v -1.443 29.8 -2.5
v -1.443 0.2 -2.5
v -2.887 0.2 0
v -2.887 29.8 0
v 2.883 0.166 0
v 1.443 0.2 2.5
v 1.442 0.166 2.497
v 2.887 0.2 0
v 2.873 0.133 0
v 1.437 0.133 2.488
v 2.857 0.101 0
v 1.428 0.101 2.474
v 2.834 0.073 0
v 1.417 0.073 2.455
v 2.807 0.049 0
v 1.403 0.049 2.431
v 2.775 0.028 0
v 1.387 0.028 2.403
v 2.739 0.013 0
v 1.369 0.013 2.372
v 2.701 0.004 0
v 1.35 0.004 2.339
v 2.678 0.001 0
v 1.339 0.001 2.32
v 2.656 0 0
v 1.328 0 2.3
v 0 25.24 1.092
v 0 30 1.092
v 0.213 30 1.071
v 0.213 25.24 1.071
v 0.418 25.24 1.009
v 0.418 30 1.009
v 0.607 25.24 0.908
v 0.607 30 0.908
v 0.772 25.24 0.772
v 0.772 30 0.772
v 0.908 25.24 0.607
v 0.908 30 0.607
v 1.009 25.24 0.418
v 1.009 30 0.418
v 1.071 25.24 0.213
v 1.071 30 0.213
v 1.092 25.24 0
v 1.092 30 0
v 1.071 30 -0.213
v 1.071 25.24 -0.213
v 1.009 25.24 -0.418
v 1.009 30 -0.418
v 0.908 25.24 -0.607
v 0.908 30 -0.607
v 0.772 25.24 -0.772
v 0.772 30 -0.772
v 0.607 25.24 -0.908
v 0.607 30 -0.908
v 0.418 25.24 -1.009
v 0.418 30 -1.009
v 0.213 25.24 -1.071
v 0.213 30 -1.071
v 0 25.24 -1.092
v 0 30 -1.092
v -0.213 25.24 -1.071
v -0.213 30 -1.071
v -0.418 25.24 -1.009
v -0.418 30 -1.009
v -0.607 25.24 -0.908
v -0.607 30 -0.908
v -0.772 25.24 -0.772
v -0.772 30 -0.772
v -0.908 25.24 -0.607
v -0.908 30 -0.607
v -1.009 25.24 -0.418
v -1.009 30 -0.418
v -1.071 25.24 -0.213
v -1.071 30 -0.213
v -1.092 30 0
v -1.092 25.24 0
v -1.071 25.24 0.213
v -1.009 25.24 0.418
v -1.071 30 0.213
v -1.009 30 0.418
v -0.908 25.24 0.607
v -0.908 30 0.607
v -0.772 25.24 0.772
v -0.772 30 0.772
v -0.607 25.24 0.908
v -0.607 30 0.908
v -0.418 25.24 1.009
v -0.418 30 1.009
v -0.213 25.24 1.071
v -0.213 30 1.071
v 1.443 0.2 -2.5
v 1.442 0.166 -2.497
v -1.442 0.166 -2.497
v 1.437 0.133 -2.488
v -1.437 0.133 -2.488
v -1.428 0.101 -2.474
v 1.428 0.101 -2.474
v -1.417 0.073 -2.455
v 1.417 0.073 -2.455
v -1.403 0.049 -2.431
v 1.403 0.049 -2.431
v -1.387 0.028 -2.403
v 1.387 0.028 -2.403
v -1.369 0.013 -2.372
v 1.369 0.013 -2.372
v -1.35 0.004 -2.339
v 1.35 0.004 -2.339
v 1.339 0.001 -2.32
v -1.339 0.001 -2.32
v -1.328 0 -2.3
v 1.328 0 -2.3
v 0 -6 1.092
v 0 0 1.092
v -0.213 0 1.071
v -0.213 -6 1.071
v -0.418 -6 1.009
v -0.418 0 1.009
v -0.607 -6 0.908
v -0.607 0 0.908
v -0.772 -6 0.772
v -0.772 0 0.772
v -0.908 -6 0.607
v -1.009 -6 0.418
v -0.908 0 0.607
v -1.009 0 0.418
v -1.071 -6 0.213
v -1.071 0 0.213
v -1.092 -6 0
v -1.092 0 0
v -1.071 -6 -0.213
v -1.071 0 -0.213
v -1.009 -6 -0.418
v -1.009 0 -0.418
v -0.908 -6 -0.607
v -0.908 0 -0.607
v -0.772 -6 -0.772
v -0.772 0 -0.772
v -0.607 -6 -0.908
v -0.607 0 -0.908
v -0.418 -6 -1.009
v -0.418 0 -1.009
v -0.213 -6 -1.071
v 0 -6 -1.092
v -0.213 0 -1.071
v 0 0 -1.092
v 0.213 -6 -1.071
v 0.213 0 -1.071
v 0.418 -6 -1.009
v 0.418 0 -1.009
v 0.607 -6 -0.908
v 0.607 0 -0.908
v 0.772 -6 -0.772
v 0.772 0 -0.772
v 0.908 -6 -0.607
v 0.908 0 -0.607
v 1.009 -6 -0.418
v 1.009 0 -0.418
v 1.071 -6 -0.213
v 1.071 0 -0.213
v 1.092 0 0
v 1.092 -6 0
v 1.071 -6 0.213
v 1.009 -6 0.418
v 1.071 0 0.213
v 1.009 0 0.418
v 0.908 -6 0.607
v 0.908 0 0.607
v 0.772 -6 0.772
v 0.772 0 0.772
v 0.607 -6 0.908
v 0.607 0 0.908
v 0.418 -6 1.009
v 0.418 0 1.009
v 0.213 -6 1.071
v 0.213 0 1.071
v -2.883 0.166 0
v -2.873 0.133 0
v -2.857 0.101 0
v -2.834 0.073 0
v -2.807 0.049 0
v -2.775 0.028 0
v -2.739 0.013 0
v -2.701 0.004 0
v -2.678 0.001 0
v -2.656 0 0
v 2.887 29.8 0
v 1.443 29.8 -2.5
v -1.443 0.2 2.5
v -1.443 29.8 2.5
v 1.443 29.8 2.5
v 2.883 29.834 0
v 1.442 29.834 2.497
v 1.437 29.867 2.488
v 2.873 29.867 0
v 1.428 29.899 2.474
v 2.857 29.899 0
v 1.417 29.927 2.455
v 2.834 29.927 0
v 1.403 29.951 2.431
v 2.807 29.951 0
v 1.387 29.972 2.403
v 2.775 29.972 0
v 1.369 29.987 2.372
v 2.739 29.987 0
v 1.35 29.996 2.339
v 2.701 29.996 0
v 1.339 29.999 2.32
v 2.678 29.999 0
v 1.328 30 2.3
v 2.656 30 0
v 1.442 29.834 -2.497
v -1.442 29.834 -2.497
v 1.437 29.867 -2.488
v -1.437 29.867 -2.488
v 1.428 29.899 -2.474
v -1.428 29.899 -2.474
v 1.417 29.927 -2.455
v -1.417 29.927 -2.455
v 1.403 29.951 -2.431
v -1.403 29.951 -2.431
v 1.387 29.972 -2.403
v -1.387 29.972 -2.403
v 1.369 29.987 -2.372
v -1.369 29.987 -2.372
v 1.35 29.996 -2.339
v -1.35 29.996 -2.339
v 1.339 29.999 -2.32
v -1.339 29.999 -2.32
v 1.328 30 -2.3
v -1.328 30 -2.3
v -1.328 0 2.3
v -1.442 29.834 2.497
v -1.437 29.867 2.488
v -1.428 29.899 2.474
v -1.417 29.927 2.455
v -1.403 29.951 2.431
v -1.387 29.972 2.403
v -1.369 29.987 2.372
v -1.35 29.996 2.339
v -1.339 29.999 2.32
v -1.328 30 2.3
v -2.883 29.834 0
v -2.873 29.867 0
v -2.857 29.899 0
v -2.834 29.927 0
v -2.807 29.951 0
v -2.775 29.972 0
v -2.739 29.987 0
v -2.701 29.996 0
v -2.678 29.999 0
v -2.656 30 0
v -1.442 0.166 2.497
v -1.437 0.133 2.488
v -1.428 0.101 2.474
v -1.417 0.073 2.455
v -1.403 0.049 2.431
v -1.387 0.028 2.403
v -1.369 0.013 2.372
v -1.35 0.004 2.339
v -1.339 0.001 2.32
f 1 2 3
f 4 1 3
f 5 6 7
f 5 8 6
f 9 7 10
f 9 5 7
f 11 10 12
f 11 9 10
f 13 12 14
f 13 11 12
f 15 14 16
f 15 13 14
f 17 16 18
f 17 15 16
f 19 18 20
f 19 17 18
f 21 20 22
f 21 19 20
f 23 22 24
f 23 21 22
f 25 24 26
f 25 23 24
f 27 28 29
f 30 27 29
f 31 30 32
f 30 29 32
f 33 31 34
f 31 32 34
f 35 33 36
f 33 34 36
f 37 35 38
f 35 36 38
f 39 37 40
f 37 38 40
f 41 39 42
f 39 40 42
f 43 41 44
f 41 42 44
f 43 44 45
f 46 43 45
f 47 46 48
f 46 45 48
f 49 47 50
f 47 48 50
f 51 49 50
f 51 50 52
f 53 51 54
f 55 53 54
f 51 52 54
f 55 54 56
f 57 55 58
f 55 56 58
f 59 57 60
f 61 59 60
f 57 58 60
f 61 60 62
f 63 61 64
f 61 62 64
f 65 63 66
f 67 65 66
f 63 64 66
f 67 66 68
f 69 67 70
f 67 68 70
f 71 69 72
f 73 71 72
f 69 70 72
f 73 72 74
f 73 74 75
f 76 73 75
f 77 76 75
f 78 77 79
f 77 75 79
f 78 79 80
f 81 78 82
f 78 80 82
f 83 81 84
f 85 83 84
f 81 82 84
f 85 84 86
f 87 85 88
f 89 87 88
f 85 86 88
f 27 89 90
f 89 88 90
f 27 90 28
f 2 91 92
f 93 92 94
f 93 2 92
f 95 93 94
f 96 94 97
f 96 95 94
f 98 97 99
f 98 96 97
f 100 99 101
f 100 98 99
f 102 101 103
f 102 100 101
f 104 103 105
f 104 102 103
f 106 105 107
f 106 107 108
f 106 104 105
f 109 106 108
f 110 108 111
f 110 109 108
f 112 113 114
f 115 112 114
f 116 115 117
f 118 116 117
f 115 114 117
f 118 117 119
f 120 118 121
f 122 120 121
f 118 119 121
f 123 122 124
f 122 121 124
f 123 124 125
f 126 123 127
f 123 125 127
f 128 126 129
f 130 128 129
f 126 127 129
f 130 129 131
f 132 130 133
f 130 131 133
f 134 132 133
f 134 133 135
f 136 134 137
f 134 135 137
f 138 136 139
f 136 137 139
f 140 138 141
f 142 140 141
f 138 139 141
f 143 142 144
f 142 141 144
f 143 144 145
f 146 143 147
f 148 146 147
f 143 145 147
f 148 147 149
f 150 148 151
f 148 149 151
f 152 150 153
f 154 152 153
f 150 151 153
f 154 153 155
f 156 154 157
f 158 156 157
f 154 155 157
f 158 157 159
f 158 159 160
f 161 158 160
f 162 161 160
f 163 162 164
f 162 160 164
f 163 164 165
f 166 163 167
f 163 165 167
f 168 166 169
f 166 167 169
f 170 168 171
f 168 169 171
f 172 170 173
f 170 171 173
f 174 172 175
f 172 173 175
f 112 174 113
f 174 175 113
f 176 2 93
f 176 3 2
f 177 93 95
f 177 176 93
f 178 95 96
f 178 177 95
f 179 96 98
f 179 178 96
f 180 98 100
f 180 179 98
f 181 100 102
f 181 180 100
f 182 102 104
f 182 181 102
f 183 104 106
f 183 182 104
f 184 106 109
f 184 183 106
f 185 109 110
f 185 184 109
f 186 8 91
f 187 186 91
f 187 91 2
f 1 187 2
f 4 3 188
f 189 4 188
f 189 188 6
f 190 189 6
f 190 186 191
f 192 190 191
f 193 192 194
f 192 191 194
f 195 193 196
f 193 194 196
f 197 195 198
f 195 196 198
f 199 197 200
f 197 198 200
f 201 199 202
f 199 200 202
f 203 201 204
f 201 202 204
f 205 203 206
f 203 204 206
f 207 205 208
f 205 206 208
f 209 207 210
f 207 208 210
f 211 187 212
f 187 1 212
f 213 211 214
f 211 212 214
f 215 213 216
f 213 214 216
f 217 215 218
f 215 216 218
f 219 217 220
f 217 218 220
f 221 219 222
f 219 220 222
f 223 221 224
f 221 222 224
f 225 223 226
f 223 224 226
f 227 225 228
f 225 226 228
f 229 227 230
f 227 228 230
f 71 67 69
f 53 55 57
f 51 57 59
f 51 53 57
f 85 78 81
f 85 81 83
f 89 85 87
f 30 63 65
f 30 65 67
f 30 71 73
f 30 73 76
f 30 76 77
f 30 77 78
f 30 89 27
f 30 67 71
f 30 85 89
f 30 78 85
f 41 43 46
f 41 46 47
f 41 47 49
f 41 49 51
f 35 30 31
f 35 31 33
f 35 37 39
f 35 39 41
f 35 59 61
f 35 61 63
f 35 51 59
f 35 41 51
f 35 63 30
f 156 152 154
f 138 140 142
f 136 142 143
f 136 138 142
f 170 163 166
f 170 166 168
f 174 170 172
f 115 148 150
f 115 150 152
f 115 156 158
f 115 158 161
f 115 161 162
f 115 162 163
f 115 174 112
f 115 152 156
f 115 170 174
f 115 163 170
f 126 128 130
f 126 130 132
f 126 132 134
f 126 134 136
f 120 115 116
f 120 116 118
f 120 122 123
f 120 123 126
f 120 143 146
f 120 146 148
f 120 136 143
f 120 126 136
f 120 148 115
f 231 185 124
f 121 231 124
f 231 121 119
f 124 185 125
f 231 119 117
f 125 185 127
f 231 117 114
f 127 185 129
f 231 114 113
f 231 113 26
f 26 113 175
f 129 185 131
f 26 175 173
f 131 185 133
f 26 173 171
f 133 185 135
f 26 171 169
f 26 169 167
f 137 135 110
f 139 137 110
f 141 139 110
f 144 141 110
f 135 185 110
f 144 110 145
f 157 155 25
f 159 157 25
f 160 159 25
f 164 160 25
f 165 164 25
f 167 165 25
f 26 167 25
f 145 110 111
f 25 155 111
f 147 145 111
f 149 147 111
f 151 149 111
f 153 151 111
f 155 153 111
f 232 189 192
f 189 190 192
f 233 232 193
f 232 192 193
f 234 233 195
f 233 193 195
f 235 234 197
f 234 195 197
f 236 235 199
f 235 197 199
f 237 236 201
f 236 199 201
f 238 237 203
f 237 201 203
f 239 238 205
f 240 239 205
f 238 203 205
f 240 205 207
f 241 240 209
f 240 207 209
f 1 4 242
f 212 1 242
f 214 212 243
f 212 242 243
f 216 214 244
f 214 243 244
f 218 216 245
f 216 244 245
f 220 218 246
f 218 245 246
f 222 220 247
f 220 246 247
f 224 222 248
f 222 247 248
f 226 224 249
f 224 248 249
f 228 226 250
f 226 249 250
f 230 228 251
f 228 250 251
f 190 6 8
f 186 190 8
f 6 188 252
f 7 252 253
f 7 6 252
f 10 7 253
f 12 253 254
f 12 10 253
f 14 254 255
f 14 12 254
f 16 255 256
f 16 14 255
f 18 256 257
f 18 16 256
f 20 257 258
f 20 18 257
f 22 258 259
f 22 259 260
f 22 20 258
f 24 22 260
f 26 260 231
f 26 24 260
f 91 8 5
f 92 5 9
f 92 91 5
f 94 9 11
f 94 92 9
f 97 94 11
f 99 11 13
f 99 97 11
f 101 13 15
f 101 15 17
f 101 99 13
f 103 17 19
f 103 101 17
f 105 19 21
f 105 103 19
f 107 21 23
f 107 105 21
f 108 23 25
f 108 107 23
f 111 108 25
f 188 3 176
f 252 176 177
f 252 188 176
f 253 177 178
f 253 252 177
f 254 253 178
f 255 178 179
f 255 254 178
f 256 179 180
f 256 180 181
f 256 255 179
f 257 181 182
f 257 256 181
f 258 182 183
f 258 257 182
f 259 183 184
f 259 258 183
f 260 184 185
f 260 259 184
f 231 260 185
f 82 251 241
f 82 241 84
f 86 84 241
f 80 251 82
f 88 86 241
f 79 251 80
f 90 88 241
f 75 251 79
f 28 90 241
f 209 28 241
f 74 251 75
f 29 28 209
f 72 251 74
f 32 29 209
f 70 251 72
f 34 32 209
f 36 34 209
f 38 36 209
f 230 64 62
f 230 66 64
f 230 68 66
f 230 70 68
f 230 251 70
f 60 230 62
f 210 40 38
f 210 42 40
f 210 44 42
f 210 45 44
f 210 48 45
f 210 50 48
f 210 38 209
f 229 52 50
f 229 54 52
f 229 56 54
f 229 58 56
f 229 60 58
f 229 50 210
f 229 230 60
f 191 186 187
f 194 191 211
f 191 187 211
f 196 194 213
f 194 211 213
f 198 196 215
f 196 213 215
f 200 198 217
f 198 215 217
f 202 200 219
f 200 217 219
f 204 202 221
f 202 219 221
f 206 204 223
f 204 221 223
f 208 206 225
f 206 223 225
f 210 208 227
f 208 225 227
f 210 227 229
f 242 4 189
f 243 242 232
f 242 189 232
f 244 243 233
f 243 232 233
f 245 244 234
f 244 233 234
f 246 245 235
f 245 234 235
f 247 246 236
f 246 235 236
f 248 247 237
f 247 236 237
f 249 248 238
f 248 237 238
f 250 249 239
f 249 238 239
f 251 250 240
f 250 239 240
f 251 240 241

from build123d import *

# Parameters (mm, degrees)
RESSALTO_EXTRUS_O1_DEPTH = 30
FILETE1_R                = 0.2
ESBO_O2_R                = 1.0922
RESSALTO_EXTRUS_O2_DEPTH = 6
ESBO_O3_R                = 1.0922
CORTE_EXTRUS_O1_DEPTH    = 4.76


with BuildPart() as part:
    # Esboço1 → Ressalto-extrusão1 (new body)
    with BuildSketch(Plane(origin=(0, 0, 0), x_dir=(1, 0, 0), z_dir=(0, 1, 0))):
        Polygon((2.886751346, 0), (1.443375673, 2.5), (-1.443375673, 2.5), (-2.886751346, 0), (-1.443375673, -2.5), (1.443375673, -2.5), align=None)
    extrude(amount=RESSALTO_EXTRUS_O1_DEPTH)

    # Filete1
    filete1_edges = [part.edges().sort_by_distance(p)[0] for p in [
        (0, 30, -2.5),
        (-2.165063509, 30, -1.25),
        (-2.165063509, 30, 1.25),
        (0, 30, 2.5),
        (2.165063509, 30, 1.25),
        (0, 0, 2.5),
        (-2.165063509, 0, 1.25),
        (-2.165063509, 0, -1.25),
        (2.165063509, 30, -1.25),
        (0, 0, -2.5),
        (2.165063509, 0, -1.25),
        (2.165063509, 0, 1.25),
    ]]
    fillet(filete1_edges, radius=FILETE1_R)

    # Esboço2 → Ressalto-extrusão2 (add)
    with BuildSketch(Plane.XZ):
        with Locations(Location((0, 0, 0), (0, 0, 90))):
            Circle(ESBO_O2_R)
    extrude(amount=RESSALTO_EXTRUS_O2_DEPTH)

    # Esboço3 → Corte-extrusão1 (cut)
    with BuildSketch(Plane(origin=(0, 30, 0), x_dir=(1, 0, 0), z_dir=(0, 1, 0))):
        with Locations(Location((0, 0, 0), (0, 0, 270))):
            Circle(ESBO_O3_R)
    extrude(amount=-CORTE_EXTRUS_O1_DEPTH, mode=Mode.SUBTRACT)


solid = part.part
